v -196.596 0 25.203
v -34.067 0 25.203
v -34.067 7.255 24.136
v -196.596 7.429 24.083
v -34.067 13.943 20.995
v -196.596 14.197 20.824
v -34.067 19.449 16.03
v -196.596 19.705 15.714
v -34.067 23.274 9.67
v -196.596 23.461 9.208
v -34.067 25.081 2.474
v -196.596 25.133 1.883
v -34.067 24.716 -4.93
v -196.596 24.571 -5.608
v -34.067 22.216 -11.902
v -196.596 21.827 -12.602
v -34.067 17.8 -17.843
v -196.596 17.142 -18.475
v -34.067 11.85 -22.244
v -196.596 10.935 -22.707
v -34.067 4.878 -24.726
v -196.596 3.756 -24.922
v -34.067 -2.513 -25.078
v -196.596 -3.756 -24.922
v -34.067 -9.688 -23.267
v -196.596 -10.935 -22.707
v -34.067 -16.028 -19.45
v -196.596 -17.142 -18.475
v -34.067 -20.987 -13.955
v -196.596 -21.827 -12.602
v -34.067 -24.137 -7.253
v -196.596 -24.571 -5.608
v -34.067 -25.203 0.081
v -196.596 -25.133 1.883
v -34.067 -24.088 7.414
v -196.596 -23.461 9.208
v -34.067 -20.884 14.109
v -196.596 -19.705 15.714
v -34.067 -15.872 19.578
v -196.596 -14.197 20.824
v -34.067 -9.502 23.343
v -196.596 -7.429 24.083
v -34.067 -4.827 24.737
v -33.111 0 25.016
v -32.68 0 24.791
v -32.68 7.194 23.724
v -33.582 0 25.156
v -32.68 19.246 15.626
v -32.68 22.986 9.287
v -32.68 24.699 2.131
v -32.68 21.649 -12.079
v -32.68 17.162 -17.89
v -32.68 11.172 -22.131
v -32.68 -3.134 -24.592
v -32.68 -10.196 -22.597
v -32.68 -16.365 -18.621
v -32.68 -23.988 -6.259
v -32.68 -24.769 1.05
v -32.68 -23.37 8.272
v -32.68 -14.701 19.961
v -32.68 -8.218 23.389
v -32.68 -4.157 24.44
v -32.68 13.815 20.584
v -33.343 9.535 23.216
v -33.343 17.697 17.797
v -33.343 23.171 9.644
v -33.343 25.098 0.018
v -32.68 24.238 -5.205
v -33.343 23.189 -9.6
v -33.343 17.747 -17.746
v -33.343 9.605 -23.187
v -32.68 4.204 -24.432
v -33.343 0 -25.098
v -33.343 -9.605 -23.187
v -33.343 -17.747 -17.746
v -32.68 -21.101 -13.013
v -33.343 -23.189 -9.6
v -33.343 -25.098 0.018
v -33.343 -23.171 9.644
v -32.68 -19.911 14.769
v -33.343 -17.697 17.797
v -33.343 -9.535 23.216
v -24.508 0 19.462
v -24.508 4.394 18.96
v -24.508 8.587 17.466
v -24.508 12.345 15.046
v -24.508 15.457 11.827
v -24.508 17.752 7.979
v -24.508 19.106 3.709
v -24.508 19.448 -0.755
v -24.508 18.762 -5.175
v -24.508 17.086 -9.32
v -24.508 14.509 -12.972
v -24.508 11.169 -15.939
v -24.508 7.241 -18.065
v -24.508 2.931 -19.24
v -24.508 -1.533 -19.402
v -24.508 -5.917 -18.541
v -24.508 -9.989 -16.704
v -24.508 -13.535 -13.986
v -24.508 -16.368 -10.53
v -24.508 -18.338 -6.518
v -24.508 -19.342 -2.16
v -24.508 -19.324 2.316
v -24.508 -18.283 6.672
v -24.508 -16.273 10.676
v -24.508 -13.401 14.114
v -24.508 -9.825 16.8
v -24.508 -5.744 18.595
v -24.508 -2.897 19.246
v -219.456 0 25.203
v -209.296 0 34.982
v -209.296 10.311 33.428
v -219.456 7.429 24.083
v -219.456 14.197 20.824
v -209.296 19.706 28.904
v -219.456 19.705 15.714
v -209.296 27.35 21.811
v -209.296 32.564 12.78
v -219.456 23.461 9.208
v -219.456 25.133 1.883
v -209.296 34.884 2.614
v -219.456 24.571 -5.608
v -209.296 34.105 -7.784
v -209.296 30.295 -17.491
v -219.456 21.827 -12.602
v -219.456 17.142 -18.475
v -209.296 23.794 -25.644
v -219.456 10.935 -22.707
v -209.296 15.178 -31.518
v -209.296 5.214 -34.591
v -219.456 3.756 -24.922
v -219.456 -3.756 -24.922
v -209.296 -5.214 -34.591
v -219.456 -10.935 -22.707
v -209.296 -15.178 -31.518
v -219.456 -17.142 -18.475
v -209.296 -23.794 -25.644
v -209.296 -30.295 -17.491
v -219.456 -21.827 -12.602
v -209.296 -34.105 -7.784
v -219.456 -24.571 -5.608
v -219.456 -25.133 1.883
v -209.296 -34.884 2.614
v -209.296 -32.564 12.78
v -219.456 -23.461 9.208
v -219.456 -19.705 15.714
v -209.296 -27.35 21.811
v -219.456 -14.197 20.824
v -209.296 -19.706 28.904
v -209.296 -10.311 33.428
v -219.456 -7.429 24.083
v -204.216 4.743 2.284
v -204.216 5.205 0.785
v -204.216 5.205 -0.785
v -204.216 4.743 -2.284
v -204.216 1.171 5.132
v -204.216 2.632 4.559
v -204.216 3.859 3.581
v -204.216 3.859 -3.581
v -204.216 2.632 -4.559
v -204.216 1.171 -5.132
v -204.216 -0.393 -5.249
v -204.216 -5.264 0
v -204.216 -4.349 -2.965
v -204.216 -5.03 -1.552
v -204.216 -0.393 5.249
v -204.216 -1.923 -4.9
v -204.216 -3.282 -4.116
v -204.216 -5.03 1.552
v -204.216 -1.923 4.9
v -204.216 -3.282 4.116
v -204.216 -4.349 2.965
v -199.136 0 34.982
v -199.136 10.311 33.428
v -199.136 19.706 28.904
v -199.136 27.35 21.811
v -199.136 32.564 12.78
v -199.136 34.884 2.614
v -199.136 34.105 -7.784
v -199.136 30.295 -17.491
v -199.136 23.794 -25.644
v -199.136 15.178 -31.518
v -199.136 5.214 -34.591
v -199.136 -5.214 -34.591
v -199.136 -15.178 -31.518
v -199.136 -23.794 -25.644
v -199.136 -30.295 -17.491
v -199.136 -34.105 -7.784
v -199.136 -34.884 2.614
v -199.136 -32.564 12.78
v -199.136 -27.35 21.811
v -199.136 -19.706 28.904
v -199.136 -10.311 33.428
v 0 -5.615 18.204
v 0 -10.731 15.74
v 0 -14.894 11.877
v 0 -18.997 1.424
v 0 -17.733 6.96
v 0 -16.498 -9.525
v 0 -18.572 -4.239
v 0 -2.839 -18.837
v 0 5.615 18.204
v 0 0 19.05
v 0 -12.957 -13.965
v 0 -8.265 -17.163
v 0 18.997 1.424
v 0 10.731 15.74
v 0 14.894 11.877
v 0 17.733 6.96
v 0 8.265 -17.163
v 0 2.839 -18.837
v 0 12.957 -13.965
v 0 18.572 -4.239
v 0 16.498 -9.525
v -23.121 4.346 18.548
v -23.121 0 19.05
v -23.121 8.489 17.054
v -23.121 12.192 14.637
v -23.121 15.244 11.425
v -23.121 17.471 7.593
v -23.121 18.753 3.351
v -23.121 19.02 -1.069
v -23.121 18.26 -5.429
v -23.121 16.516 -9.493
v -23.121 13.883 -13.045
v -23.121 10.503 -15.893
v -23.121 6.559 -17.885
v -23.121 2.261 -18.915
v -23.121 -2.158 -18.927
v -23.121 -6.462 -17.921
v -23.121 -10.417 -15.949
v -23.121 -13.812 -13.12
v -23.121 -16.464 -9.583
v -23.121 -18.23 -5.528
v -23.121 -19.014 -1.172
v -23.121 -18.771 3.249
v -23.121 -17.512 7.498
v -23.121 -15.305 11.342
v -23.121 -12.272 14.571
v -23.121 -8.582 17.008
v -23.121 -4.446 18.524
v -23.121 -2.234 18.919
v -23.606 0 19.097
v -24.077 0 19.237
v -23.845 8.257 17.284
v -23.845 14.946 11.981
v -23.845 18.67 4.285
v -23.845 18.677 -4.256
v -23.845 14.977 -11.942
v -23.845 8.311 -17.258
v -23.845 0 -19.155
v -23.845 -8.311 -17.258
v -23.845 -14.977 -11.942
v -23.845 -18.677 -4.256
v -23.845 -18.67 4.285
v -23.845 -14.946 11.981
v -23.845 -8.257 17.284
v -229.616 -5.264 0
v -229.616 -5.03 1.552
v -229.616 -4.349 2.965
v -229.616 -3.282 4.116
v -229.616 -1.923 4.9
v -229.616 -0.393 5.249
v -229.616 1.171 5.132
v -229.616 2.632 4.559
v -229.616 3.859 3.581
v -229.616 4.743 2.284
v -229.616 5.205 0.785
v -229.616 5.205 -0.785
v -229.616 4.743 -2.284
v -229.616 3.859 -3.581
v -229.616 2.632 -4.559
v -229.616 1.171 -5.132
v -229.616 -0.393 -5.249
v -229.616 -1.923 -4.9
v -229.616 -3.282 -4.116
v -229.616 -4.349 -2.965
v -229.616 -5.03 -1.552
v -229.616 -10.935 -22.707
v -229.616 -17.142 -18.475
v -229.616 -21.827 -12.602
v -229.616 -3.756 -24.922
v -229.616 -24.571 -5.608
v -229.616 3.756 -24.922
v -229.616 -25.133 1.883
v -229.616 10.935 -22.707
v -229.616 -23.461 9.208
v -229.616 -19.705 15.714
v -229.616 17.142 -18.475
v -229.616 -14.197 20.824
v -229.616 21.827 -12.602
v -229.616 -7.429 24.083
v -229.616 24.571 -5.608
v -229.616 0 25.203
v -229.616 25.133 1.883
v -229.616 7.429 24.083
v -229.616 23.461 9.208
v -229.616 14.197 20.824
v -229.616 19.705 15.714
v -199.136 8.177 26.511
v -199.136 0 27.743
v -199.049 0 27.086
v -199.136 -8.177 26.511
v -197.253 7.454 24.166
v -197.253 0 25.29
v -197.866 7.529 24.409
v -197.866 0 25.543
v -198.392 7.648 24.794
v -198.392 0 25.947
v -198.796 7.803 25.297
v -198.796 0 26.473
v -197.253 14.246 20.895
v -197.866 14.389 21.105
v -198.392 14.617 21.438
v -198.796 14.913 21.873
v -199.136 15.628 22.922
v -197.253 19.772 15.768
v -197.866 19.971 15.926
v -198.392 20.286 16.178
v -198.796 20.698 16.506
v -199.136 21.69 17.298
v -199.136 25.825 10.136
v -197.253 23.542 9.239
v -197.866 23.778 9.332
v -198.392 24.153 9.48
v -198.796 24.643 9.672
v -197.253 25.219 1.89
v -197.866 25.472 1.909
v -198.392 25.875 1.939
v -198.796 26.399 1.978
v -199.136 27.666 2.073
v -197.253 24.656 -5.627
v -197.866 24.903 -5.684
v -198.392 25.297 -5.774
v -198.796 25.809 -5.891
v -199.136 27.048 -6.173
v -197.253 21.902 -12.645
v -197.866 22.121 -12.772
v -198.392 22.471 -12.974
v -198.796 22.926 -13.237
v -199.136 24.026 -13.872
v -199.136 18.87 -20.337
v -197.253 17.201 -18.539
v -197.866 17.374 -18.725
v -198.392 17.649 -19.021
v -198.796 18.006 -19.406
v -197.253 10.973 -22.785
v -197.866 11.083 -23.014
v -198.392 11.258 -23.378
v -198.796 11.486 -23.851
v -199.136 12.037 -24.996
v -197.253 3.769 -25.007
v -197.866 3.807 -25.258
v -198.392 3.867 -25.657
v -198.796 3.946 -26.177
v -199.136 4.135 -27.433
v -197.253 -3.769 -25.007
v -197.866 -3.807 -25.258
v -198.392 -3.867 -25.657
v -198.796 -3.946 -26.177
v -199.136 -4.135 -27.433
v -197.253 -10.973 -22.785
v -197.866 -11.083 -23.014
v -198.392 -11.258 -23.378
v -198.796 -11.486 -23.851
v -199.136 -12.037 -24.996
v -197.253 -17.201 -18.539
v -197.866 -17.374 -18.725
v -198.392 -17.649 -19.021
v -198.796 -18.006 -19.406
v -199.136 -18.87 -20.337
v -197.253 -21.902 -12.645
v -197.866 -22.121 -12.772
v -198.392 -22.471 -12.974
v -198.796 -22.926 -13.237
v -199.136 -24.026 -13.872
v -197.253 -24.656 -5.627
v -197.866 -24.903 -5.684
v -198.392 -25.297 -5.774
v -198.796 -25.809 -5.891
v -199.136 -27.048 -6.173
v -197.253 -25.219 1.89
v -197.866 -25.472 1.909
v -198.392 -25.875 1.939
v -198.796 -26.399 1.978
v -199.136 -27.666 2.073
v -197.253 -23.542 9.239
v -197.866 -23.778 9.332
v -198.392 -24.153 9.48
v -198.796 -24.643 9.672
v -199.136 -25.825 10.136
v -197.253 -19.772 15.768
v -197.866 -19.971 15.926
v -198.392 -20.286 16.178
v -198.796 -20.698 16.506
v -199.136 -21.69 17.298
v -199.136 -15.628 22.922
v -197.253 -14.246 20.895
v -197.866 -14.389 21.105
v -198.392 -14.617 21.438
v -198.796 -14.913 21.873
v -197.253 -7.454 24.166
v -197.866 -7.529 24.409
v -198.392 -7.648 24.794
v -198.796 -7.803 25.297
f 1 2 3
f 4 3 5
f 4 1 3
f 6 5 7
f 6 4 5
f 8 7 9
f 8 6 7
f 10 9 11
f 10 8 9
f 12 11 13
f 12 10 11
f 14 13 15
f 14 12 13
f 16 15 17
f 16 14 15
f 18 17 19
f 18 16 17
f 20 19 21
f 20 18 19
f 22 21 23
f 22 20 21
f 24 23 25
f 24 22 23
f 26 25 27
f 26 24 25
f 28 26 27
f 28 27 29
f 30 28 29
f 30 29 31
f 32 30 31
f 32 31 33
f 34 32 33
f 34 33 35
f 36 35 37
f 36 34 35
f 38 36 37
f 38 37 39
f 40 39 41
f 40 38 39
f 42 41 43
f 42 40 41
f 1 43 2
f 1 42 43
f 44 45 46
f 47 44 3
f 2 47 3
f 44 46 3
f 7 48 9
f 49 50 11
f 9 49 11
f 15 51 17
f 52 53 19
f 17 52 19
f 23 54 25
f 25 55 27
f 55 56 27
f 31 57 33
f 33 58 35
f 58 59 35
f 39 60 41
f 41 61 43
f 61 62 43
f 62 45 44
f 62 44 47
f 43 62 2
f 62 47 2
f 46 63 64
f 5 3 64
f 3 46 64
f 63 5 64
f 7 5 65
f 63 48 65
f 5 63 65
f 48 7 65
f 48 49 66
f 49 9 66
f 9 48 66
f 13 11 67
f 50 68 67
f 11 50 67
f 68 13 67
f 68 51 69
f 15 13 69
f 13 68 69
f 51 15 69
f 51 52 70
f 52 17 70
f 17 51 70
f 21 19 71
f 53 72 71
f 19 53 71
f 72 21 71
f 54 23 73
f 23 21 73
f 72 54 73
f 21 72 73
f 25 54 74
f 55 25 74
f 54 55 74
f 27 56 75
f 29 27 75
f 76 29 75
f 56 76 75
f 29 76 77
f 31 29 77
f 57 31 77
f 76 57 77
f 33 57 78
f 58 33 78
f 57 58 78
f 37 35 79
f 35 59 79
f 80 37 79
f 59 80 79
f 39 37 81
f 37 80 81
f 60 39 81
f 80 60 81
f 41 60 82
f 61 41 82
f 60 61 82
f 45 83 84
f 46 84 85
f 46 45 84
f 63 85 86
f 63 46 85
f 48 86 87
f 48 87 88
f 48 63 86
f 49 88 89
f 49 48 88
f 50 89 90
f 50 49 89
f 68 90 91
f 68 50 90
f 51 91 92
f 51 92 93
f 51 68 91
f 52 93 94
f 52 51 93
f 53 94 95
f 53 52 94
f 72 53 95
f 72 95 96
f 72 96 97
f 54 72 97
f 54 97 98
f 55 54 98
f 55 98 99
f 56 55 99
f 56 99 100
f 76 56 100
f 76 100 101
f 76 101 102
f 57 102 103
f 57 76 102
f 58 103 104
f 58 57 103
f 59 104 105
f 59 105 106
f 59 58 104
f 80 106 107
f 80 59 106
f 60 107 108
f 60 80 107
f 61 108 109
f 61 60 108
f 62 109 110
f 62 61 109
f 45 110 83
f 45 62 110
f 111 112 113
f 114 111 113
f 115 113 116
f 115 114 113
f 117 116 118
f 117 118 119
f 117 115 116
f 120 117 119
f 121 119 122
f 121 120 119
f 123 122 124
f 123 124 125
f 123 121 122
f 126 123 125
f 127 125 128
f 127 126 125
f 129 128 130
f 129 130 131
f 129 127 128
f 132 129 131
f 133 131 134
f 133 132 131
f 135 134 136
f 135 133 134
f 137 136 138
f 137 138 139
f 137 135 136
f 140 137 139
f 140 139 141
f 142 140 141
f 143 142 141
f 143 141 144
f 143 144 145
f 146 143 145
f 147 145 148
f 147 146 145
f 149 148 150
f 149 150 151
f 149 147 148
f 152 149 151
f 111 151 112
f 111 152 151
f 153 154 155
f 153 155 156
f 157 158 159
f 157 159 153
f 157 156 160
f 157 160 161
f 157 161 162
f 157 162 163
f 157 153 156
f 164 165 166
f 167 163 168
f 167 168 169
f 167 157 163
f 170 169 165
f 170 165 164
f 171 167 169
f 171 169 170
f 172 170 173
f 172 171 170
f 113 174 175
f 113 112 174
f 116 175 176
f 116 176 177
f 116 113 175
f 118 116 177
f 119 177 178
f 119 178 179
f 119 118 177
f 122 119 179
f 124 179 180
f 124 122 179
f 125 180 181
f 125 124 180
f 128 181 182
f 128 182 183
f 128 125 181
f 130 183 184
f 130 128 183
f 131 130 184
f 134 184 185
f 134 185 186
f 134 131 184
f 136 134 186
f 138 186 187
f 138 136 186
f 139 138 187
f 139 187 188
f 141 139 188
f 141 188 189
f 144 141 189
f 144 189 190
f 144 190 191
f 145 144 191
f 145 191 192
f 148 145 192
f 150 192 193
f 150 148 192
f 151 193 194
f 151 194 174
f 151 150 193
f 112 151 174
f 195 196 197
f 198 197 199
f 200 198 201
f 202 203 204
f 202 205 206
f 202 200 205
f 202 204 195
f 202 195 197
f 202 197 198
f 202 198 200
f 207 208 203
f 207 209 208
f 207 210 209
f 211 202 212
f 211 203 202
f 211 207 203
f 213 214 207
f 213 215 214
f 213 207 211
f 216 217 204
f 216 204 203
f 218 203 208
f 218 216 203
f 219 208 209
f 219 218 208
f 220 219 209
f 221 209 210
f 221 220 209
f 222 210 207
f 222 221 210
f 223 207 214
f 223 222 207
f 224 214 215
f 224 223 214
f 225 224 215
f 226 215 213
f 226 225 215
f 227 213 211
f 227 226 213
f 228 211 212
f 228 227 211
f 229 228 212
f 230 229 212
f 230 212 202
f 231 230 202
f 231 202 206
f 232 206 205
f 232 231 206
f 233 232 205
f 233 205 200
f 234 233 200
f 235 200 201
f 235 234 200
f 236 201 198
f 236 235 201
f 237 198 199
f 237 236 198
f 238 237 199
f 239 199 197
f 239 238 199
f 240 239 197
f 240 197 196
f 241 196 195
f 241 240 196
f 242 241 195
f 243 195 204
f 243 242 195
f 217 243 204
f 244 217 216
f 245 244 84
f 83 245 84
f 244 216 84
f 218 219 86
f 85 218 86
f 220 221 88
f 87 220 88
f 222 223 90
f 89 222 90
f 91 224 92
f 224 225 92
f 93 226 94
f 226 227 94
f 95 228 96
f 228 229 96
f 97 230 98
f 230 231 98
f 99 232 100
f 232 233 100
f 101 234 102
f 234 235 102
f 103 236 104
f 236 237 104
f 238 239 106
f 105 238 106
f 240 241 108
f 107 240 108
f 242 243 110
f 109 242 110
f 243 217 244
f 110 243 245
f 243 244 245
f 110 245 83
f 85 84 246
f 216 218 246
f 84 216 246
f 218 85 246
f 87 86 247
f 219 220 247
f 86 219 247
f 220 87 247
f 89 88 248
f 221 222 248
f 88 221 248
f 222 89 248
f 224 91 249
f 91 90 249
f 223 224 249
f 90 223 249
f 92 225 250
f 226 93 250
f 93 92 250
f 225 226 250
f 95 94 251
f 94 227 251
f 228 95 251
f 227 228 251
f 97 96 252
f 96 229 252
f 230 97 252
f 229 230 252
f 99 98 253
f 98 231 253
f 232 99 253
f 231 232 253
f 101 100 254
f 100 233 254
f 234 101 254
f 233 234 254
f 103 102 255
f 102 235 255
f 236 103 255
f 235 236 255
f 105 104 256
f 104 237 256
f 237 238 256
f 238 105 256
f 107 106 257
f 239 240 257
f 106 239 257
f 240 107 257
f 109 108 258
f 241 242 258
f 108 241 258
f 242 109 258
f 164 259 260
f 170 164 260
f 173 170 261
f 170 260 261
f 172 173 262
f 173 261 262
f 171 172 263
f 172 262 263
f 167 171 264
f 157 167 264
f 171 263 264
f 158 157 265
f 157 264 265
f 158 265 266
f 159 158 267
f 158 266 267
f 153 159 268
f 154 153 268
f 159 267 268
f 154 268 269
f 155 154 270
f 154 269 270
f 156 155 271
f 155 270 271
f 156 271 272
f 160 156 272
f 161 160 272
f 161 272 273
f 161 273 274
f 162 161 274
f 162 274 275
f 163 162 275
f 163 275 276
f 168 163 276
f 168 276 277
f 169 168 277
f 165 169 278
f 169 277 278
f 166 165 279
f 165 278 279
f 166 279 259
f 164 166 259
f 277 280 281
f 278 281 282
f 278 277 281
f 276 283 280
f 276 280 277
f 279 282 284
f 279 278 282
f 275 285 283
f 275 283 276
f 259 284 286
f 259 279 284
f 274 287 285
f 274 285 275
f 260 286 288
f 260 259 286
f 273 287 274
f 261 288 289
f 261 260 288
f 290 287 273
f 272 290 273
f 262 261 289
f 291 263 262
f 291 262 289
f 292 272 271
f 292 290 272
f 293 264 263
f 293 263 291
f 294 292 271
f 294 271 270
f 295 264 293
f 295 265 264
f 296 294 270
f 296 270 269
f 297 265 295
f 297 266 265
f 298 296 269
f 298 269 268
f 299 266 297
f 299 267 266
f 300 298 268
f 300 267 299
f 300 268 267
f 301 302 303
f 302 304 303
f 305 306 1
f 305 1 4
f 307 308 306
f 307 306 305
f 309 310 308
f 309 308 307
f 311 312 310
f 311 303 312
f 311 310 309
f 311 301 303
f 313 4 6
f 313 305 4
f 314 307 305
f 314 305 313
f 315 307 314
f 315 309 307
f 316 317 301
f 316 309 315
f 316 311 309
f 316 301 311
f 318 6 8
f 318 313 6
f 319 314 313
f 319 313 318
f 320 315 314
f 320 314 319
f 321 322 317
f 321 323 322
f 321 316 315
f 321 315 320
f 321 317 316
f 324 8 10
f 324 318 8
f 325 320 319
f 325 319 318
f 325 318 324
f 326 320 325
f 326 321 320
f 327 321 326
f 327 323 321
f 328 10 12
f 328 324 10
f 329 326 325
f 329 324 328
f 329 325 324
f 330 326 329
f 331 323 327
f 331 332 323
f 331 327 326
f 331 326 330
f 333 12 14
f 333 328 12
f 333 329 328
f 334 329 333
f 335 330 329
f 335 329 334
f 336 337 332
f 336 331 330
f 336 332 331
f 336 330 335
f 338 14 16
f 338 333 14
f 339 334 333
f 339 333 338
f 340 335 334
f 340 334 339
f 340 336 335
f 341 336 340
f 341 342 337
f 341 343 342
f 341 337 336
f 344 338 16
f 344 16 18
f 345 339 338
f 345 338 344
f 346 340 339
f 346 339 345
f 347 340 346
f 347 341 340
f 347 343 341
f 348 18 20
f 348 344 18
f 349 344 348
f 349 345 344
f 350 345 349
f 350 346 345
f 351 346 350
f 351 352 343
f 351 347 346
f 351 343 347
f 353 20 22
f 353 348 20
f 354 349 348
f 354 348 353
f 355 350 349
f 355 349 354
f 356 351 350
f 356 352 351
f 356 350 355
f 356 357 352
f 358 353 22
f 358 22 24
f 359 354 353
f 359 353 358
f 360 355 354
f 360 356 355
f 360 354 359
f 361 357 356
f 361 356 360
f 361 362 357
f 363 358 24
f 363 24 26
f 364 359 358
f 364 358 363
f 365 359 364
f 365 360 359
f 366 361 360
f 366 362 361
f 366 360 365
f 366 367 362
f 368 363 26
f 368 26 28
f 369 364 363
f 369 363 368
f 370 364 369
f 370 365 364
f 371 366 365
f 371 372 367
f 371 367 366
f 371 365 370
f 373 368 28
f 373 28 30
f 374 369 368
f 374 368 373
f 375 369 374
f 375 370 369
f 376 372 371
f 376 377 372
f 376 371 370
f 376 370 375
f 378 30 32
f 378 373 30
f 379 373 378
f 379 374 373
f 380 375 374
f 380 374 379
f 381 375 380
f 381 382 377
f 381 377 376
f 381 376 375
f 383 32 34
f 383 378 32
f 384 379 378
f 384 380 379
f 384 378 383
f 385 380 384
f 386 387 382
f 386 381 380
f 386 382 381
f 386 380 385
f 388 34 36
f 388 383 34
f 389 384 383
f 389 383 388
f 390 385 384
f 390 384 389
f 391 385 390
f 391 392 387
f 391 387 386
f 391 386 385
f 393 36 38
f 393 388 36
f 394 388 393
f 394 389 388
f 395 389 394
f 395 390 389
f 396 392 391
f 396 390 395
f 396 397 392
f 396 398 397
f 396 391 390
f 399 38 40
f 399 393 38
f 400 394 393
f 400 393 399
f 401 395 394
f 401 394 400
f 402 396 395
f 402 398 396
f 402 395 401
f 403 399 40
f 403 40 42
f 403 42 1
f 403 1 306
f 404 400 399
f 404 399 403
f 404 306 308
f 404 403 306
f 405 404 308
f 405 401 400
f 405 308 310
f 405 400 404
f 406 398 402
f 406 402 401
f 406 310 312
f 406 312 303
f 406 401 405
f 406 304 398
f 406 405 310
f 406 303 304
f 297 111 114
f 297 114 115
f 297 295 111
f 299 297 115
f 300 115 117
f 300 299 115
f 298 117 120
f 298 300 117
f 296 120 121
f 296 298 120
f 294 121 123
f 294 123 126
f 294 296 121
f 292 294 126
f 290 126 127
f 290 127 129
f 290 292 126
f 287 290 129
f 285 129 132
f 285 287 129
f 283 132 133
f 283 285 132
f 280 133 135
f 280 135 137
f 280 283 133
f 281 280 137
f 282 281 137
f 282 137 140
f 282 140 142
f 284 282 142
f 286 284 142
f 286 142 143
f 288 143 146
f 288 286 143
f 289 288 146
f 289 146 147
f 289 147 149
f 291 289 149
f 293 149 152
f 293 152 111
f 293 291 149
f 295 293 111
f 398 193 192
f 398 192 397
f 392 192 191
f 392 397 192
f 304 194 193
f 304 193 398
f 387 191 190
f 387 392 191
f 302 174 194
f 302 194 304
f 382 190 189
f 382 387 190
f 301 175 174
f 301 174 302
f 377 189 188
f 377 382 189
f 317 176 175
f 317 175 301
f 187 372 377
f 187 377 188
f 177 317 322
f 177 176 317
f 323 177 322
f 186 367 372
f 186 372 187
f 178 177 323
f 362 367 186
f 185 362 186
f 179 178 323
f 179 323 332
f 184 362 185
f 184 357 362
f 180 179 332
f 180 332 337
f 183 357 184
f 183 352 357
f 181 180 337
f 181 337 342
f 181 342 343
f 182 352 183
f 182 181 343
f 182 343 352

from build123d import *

# Parameters (mm, degrees)
F2_R     = 5.26415
F3_DEPTH = 25.4
F5_R     = 2.54
F6_R     = 2.54


with BuildPart() as f1:
    # F0 (on Front) → F1 (revolve)
    with BuildSketch(Plane.XZ):
        Polygon((-229.616, 0), (0, 0), (0, 19.05), (-23.876, 19.05), (-33.311927, 25.20315), (-199.136, 25.20315), (-199.136, 34.98215), (-209.296, 34.98215), (-219.456, 25.20315), (-229.616, 25.20315), align=None)
    revolve(axis=Axis((-114.808, 0, 0), (-1, 0, 0)))

    # F2 (on face) → F3 (cut)
    with BuildSketch(Plane(origin=(-229.616, 0, 0), x_dir=(0, -1, 0), z_dir=(-1, 0, 0))):
        Circle(F2_R)
    extrude(amount=-F3_DEPTH, mode=Mode.SUBTRACT)

    # F5
    f5_edges = [f1.edges().sort_by_distance(p)[0] for p in [
        (-23.876, 0, -19.05),
        (-33.311927, 0, -25.20315),
    ]]
    fillet(f5_edges, radius=F5_R)

    # F6
    f6_edges = [f1.edges().sort_by_distance(p)[0] for p in [
        (-199.136, 0, -25.20315),
    ]]
    fillet(f6_edges, radius=F6_R)


solid = f1.part
